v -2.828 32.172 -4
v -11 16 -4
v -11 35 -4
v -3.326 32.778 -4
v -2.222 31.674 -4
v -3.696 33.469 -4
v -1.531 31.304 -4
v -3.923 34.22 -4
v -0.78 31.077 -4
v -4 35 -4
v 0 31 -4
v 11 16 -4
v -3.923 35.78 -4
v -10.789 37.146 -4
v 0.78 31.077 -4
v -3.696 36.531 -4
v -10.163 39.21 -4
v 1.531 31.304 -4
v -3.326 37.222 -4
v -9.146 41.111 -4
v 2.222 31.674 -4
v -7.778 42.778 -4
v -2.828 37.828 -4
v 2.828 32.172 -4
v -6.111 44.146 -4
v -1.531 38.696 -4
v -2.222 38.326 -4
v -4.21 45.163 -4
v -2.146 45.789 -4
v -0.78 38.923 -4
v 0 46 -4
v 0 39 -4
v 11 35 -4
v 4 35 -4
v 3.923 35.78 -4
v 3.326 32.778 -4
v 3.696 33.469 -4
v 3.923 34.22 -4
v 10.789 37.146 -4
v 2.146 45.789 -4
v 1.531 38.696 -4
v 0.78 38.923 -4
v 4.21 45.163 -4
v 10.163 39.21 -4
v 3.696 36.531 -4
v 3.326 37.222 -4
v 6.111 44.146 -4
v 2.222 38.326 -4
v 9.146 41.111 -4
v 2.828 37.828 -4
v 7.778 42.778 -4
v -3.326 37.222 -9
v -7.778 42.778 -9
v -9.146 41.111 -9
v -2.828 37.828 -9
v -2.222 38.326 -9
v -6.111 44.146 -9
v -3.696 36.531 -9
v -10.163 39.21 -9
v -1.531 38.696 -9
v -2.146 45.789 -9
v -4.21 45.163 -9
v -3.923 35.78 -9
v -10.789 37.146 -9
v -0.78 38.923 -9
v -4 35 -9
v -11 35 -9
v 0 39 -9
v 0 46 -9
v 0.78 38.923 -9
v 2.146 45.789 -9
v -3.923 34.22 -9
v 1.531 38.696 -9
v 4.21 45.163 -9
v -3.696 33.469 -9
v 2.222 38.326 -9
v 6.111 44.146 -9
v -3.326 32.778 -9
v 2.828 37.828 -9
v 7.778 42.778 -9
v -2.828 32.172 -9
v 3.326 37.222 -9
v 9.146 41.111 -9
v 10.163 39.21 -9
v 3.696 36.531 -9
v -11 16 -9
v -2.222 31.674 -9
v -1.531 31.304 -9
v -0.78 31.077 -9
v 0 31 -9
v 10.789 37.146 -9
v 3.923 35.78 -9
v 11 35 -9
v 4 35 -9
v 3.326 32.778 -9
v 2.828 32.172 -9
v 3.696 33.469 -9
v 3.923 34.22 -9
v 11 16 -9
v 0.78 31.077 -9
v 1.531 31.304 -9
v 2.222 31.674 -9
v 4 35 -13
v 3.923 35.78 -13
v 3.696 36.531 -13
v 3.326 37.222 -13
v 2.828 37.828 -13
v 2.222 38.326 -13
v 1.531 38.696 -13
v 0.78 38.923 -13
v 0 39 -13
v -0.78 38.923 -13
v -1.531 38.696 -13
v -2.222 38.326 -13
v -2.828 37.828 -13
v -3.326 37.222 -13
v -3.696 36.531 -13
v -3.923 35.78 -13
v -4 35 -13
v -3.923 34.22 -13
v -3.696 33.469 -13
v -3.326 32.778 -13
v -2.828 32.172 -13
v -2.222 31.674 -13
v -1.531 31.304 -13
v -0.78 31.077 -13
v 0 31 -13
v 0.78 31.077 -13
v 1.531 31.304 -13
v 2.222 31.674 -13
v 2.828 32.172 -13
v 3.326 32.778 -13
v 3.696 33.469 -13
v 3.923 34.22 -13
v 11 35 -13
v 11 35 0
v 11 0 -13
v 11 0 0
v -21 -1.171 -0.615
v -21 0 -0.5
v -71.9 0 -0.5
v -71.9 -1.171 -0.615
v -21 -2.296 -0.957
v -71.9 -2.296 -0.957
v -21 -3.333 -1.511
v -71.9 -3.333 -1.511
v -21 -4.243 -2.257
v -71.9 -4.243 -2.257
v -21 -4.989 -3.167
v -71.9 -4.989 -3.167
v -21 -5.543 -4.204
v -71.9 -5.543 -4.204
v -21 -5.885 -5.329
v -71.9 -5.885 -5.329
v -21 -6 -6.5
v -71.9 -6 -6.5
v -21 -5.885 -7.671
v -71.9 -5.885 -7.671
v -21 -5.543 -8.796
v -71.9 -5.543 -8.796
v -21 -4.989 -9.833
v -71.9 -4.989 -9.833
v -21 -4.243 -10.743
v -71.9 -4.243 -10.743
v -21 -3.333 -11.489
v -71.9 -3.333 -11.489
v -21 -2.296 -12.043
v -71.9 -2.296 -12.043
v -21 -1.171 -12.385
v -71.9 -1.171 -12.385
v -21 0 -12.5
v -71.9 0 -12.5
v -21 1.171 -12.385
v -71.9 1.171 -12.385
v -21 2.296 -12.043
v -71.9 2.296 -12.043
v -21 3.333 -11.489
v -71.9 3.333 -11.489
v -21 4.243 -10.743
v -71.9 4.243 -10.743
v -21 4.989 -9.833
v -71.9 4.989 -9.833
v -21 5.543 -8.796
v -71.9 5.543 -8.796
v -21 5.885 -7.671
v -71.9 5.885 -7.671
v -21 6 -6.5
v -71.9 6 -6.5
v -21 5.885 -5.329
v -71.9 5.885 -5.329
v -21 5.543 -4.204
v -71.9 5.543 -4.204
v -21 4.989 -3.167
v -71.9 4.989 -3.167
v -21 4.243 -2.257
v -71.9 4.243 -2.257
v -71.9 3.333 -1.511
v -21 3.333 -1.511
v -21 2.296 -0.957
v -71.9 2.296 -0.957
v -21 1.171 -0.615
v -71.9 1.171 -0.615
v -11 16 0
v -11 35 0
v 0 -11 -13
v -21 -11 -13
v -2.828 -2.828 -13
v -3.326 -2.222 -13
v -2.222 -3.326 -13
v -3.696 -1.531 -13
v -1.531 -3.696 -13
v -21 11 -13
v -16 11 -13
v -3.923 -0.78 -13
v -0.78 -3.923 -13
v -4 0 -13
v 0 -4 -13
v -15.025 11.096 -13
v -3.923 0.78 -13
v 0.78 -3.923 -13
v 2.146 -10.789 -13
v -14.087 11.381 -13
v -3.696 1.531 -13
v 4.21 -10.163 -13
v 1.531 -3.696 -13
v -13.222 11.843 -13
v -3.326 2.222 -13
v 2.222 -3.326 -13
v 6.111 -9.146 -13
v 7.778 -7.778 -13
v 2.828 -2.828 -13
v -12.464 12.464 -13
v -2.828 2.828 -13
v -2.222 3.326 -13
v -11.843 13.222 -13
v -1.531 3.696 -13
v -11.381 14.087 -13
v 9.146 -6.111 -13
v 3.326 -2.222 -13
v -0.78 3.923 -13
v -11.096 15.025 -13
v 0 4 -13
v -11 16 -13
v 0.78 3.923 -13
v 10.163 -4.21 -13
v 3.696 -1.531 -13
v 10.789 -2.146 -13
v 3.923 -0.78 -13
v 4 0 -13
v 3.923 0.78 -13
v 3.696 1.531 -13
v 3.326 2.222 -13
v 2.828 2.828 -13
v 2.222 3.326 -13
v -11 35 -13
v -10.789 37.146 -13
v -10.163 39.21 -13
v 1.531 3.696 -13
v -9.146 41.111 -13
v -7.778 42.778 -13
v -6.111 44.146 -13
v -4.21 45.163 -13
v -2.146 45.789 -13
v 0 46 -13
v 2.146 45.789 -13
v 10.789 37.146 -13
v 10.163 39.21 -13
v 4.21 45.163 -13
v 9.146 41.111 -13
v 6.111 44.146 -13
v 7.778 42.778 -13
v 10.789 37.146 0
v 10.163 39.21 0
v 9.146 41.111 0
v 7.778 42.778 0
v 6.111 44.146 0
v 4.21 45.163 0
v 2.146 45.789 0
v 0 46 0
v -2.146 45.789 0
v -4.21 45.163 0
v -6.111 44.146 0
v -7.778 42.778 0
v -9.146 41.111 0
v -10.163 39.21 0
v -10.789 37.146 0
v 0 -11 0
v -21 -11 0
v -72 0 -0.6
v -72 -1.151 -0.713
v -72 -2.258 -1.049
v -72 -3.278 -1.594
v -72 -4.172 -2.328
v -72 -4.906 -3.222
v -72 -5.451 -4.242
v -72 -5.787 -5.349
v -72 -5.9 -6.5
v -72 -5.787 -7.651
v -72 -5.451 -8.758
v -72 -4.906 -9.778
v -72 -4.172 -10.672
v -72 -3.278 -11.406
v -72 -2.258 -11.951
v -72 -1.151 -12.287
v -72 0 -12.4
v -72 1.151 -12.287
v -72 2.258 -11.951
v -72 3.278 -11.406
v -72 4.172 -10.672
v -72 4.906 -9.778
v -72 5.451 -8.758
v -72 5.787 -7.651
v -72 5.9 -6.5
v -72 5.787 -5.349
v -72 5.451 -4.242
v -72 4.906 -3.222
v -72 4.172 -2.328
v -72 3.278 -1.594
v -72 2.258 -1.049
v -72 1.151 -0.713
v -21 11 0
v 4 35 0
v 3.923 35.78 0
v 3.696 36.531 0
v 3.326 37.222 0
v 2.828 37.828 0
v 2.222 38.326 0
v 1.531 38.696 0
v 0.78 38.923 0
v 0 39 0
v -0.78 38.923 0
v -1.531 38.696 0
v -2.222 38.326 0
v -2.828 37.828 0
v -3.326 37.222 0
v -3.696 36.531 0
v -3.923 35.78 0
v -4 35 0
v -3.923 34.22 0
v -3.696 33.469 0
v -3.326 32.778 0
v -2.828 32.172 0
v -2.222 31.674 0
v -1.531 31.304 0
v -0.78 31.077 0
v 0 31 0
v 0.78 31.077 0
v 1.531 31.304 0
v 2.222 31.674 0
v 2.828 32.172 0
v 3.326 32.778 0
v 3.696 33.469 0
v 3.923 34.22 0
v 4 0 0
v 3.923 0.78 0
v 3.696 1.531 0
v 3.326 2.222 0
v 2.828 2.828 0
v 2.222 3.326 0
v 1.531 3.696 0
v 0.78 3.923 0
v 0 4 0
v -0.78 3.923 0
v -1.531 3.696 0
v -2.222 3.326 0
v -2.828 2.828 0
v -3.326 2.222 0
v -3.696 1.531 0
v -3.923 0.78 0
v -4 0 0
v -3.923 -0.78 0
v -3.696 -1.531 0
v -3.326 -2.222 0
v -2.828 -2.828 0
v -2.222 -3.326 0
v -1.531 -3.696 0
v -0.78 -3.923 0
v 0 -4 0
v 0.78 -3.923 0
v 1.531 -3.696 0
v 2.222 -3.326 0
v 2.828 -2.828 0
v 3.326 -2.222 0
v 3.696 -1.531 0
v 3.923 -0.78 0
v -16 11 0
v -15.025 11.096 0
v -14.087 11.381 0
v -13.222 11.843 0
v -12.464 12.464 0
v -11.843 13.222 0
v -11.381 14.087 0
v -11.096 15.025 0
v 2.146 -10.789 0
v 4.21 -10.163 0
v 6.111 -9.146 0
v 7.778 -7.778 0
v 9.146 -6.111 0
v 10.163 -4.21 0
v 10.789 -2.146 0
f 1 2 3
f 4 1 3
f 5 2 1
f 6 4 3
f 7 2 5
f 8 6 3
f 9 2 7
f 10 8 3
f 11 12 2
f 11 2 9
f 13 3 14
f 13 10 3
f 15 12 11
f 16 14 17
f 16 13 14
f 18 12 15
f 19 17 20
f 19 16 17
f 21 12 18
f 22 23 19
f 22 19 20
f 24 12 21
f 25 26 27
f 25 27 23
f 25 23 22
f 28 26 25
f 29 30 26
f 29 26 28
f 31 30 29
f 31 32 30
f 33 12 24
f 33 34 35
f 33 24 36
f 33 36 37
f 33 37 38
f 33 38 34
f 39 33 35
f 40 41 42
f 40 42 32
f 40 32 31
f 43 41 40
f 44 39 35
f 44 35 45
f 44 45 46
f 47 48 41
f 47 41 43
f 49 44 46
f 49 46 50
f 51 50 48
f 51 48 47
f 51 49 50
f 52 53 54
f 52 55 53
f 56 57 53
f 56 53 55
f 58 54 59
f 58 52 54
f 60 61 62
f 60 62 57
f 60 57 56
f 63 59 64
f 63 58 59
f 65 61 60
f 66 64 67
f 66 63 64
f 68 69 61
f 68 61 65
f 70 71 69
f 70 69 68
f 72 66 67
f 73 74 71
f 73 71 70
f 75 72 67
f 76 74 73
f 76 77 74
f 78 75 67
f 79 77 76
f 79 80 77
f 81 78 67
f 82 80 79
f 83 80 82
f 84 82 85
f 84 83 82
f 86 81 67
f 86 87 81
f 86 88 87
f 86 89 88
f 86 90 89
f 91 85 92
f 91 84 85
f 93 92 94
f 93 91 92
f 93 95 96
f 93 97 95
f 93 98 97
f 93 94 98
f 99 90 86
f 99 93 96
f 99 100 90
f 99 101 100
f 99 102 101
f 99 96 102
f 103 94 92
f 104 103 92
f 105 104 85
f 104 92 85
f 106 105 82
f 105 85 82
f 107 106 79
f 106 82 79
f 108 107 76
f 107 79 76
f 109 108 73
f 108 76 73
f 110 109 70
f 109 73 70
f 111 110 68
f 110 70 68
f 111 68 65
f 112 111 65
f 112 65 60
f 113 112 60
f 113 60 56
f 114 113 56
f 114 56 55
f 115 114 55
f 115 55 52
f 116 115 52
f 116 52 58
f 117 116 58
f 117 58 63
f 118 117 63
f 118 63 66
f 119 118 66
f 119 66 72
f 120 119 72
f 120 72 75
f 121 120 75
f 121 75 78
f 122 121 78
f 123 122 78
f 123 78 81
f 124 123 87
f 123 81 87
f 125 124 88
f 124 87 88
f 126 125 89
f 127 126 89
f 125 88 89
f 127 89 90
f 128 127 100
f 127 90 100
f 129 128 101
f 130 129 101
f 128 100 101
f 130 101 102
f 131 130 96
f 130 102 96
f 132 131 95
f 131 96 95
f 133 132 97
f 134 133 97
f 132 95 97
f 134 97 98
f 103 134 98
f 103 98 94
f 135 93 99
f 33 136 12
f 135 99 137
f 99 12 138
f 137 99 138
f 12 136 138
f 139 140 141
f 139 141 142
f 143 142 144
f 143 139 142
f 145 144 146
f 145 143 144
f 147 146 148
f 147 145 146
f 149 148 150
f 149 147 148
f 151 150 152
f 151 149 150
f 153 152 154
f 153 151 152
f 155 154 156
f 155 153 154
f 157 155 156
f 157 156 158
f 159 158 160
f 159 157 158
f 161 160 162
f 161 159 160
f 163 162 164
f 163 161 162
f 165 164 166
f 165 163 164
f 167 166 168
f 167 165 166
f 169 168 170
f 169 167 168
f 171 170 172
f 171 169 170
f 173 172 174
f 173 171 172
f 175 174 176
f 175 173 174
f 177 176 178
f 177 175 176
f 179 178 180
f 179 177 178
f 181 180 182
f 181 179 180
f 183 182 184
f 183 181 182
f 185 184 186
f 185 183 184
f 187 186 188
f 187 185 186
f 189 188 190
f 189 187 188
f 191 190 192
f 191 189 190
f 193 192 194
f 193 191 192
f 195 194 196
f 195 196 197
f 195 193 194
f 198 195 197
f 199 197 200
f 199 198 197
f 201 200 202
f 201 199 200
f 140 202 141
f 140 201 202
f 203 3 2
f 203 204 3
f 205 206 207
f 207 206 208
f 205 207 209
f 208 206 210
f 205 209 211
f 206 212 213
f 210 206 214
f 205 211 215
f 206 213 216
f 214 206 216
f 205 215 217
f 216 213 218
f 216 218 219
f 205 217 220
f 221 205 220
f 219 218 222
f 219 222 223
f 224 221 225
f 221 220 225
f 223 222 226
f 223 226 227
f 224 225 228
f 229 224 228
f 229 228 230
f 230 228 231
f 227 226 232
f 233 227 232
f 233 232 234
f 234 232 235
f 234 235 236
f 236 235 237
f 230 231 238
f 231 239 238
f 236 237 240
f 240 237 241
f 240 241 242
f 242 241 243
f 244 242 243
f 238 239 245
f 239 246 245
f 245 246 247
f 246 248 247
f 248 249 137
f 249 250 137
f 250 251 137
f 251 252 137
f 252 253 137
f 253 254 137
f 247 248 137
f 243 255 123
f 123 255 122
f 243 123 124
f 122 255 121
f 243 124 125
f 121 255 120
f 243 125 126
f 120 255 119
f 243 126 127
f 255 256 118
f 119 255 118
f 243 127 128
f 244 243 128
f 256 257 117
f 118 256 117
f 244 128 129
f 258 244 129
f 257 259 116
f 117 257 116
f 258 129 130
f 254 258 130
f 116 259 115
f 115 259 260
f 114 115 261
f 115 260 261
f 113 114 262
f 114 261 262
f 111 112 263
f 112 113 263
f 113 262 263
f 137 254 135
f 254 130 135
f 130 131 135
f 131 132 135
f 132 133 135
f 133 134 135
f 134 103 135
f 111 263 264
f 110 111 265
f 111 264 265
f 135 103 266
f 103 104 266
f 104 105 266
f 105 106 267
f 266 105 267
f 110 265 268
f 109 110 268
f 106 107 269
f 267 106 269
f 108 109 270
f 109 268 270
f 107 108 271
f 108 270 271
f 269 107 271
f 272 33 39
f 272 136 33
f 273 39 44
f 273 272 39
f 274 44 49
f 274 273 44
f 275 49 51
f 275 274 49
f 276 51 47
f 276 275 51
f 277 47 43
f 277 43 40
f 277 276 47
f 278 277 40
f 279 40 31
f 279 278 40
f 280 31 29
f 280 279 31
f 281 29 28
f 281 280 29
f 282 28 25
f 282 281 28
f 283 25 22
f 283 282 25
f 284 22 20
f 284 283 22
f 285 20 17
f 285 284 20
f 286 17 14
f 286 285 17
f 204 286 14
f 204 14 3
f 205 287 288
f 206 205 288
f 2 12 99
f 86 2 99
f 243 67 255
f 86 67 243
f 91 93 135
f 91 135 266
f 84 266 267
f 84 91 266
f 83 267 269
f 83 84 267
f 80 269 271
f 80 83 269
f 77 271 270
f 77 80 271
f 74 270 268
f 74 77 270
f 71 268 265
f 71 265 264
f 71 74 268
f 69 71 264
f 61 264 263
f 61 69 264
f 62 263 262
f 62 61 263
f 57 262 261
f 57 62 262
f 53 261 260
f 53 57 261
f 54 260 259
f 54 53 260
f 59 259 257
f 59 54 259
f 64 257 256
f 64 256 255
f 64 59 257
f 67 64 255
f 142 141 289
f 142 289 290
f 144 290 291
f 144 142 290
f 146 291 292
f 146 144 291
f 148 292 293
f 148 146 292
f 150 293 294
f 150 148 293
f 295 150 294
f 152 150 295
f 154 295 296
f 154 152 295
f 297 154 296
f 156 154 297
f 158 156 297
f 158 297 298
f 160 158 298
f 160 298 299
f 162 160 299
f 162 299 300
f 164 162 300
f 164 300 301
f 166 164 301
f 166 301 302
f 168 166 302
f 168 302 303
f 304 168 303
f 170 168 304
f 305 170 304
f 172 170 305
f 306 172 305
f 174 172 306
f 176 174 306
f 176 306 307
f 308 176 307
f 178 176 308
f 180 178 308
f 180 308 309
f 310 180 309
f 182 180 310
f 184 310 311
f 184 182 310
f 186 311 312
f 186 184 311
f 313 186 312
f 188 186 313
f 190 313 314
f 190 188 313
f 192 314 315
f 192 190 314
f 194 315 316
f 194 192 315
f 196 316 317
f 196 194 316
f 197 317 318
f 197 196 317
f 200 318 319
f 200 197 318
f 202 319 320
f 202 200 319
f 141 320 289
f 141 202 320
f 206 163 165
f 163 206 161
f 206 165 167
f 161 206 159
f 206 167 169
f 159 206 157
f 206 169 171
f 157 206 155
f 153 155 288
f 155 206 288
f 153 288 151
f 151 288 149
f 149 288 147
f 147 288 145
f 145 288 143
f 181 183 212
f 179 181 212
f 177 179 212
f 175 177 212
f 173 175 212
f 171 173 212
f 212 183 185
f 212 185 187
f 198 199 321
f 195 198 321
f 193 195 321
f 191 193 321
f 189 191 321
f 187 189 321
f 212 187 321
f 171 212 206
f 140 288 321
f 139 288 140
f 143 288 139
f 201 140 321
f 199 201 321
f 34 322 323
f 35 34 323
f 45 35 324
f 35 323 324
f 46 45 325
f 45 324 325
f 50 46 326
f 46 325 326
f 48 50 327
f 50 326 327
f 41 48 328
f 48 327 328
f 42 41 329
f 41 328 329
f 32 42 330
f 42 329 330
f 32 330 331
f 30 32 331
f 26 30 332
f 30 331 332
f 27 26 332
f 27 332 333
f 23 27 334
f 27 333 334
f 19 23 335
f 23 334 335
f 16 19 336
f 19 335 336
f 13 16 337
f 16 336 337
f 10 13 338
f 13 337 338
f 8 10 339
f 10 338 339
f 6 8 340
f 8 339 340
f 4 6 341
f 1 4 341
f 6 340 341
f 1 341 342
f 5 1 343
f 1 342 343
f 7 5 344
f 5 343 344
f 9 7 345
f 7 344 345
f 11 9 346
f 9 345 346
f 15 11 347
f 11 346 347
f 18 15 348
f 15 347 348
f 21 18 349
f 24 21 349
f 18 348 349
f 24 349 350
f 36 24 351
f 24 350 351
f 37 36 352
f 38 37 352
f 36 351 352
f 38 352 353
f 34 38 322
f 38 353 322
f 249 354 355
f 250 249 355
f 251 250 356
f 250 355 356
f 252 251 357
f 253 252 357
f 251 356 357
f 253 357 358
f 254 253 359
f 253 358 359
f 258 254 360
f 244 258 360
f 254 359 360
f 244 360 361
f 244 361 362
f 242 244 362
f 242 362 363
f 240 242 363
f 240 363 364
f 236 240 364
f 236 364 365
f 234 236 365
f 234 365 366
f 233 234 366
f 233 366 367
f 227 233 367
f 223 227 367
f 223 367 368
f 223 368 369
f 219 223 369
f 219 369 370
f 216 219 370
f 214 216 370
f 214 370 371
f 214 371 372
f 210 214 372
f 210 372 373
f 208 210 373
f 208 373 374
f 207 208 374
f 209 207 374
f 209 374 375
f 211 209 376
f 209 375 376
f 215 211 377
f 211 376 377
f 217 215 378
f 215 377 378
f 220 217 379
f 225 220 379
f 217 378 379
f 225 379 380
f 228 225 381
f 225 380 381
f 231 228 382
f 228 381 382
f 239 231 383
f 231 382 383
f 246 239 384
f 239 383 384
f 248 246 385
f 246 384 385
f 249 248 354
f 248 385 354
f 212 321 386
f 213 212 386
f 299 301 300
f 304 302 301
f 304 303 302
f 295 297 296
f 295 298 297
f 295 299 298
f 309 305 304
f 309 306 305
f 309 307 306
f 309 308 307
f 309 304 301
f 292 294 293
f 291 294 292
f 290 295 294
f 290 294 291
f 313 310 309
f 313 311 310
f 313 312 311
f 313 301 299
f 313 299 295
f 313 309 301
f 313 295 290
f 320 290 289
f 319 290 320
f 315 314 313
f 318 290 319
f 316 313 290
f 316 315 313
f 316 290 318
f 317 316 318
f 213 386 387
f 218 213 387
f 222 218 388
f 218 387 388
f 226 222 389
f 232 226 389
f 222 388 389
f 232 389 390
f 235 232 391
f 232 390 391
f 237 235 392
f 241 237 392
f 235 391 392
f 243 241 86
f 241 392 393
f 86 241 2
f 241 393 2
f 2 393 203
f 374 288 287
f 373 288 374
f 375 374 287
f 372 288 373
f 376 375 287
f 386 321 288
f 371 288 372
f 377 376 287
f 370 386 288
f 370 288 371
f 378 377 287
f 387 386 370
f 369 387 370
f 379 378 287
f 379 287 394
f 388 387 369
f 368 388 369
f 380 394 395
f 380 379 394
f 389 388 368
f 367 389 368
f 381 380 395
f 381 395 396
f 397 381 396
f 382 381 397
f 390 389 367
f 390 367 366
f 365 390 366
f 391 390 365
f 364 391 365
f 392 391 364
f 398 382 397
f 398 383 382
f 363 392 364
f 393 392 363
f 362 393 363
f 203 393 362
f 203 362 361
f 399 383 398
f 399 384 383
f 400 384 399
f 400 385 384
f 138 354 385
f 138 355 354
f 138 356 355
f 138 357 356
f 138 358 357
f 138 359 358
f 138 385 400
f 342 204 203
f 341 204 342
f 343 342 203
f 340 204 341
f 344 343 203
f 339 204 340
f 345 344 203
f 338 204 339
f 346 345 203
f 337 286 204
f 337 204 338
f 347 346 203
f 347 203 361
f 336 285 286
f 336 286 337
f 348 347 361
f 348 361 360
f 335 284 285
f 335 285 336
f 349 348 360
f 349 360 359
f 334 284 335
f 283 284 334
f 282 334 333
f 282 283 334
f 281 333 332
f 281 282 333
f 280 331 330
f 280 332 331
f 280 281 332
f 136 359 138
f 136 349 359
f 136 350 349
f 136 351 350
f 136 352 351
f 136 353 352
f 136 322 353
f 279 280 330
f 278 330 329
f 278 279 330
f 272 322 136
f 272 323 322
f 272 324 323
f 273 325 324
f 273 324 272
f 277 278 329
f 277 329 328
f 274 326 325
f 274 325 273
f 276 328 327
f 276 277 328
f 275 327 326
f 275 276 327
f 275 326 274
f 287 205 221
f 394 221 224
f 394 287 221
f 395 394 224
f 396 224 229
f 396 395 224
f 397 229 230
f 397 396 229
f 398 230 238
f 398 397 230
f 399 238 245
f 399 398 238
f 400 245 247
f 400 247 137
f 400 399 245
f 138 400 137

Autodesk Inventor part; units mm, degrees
ref_plane "YZ Plane" through (0, 0, 0) normal (1, 0, 0) x (0, 1, 0)
ref_plane "XZ Plane" through (0, 0, 0) normal (0, 1, 0) x (-1, 0, 0)
ref_plane "XY Plane" through (0, 0, 0) normal (0, 0, 1) x (1, 0, 0)
sketch "Boceto1" plane through (0, 0, 0) normal (0, 0, 1) x (1, 0, 0)
  circle A0 centre (0, 0) radius 4
  arc A1 (0, -11) -> (11, 0) centre (0, 0) ccw
  line L0 (0, -11) -> (-21, -11)
  line L1 (0, -11) -> (0, 35) construction
  circle A2 centre (0, 35) radius 4
  arc A3 (11, 35) -> (-11, 35) centre (0, 35) ccw
  line L2 (11, 35) -> (11, 0)
  line L3 (-21, -11) -> (-21, 11)
  line L4 (-21, 11) -> (-16, 11)
  line L5 (0, 35) -> (-11, 35) construction
  line L6 (-11, 35) -> (-11, 16)
  arc A4 (-16, 11) -> (-11, 16) centre (-16, 16) ccw
  dimension "d0" = 8
  dimension "d1" = 22
  dimension "d2" = 21
  dimension "d3" = 46
  dimension "d4" = 8
  dimension "d5" = 22
  dimension "d6" = 22
  dimension "d7" = 5
extrude "Extrusión1" add sketch "Boceto1" against normal blind 13
sketch "Boceto2" plane through (11, 0, 0) normal (1, 0, 0) x (0, 0, -1)
  line L0 (0, 0) -> (4, 0) construction
  line L1 (0, 0) -> (13, 0) construction
  line L2 (0, 35) -> (13, 35) projected
  line L3 (13, 31) -> (0, 31) projected
  line L4 (4, 0) -> (9, 0) construction
  line L5 (13, -11) -> (13, 0) projected
  line L6 (9, 0) -> (13, 0) construction
  line L7 (0, 16) -> (13, 16) construction
  line L8 (4, 16) -> (4, 49.4932)
  line L9 (4, 49.4932) -> (9, 49.4932)
  line L10 (9, 49.4932) -> (9, 16)
  line L11 (4, 16) -> (9, 16)
  line L12 (13, 35) -> (13, 46) projected
  dimension "d10" = 4
  dimension "d11" = 5
  dimension "d12" = 33.4932
  dimension "d13" = 5
  dimension "d14" = 4
extrude "Extrusión2" cut sketch "Boceto2" against normal through all
sketch "Boceto3" plane through (-21, -11, 0) normal (-1, 0, 0) x (0, 0, 1)
  line L0 (-13, 0) -> (-13, 22) projected
  circle A0 centre (-6.5, 11) radius 6
  line L1 (0, 22) -> (-13, 22) projected
  line L2 (-6.5, 22) -> (-6.5, 0) construction
  line L3 (0, 0) -> (-13, 0) projected
  line L4 (0, 11) -> (-13, 11) construction
  line L5 (-13, 11) -> (0, 11)
  dimension "d26" = 12
extrude "Extrusión3" add sketch "Boceto3" along normal blind 51
thread "Rosca1" size "M12x1.75" class "6g" standard "ANSI Metric M Profile" full length
chamfer "Chaflán1" distance 0.1 angle 45 1 edges at (-72, 0, -12.5) measured on face at (-72, -0.4786, -4.5581)
properties part number "19_UnionB"
